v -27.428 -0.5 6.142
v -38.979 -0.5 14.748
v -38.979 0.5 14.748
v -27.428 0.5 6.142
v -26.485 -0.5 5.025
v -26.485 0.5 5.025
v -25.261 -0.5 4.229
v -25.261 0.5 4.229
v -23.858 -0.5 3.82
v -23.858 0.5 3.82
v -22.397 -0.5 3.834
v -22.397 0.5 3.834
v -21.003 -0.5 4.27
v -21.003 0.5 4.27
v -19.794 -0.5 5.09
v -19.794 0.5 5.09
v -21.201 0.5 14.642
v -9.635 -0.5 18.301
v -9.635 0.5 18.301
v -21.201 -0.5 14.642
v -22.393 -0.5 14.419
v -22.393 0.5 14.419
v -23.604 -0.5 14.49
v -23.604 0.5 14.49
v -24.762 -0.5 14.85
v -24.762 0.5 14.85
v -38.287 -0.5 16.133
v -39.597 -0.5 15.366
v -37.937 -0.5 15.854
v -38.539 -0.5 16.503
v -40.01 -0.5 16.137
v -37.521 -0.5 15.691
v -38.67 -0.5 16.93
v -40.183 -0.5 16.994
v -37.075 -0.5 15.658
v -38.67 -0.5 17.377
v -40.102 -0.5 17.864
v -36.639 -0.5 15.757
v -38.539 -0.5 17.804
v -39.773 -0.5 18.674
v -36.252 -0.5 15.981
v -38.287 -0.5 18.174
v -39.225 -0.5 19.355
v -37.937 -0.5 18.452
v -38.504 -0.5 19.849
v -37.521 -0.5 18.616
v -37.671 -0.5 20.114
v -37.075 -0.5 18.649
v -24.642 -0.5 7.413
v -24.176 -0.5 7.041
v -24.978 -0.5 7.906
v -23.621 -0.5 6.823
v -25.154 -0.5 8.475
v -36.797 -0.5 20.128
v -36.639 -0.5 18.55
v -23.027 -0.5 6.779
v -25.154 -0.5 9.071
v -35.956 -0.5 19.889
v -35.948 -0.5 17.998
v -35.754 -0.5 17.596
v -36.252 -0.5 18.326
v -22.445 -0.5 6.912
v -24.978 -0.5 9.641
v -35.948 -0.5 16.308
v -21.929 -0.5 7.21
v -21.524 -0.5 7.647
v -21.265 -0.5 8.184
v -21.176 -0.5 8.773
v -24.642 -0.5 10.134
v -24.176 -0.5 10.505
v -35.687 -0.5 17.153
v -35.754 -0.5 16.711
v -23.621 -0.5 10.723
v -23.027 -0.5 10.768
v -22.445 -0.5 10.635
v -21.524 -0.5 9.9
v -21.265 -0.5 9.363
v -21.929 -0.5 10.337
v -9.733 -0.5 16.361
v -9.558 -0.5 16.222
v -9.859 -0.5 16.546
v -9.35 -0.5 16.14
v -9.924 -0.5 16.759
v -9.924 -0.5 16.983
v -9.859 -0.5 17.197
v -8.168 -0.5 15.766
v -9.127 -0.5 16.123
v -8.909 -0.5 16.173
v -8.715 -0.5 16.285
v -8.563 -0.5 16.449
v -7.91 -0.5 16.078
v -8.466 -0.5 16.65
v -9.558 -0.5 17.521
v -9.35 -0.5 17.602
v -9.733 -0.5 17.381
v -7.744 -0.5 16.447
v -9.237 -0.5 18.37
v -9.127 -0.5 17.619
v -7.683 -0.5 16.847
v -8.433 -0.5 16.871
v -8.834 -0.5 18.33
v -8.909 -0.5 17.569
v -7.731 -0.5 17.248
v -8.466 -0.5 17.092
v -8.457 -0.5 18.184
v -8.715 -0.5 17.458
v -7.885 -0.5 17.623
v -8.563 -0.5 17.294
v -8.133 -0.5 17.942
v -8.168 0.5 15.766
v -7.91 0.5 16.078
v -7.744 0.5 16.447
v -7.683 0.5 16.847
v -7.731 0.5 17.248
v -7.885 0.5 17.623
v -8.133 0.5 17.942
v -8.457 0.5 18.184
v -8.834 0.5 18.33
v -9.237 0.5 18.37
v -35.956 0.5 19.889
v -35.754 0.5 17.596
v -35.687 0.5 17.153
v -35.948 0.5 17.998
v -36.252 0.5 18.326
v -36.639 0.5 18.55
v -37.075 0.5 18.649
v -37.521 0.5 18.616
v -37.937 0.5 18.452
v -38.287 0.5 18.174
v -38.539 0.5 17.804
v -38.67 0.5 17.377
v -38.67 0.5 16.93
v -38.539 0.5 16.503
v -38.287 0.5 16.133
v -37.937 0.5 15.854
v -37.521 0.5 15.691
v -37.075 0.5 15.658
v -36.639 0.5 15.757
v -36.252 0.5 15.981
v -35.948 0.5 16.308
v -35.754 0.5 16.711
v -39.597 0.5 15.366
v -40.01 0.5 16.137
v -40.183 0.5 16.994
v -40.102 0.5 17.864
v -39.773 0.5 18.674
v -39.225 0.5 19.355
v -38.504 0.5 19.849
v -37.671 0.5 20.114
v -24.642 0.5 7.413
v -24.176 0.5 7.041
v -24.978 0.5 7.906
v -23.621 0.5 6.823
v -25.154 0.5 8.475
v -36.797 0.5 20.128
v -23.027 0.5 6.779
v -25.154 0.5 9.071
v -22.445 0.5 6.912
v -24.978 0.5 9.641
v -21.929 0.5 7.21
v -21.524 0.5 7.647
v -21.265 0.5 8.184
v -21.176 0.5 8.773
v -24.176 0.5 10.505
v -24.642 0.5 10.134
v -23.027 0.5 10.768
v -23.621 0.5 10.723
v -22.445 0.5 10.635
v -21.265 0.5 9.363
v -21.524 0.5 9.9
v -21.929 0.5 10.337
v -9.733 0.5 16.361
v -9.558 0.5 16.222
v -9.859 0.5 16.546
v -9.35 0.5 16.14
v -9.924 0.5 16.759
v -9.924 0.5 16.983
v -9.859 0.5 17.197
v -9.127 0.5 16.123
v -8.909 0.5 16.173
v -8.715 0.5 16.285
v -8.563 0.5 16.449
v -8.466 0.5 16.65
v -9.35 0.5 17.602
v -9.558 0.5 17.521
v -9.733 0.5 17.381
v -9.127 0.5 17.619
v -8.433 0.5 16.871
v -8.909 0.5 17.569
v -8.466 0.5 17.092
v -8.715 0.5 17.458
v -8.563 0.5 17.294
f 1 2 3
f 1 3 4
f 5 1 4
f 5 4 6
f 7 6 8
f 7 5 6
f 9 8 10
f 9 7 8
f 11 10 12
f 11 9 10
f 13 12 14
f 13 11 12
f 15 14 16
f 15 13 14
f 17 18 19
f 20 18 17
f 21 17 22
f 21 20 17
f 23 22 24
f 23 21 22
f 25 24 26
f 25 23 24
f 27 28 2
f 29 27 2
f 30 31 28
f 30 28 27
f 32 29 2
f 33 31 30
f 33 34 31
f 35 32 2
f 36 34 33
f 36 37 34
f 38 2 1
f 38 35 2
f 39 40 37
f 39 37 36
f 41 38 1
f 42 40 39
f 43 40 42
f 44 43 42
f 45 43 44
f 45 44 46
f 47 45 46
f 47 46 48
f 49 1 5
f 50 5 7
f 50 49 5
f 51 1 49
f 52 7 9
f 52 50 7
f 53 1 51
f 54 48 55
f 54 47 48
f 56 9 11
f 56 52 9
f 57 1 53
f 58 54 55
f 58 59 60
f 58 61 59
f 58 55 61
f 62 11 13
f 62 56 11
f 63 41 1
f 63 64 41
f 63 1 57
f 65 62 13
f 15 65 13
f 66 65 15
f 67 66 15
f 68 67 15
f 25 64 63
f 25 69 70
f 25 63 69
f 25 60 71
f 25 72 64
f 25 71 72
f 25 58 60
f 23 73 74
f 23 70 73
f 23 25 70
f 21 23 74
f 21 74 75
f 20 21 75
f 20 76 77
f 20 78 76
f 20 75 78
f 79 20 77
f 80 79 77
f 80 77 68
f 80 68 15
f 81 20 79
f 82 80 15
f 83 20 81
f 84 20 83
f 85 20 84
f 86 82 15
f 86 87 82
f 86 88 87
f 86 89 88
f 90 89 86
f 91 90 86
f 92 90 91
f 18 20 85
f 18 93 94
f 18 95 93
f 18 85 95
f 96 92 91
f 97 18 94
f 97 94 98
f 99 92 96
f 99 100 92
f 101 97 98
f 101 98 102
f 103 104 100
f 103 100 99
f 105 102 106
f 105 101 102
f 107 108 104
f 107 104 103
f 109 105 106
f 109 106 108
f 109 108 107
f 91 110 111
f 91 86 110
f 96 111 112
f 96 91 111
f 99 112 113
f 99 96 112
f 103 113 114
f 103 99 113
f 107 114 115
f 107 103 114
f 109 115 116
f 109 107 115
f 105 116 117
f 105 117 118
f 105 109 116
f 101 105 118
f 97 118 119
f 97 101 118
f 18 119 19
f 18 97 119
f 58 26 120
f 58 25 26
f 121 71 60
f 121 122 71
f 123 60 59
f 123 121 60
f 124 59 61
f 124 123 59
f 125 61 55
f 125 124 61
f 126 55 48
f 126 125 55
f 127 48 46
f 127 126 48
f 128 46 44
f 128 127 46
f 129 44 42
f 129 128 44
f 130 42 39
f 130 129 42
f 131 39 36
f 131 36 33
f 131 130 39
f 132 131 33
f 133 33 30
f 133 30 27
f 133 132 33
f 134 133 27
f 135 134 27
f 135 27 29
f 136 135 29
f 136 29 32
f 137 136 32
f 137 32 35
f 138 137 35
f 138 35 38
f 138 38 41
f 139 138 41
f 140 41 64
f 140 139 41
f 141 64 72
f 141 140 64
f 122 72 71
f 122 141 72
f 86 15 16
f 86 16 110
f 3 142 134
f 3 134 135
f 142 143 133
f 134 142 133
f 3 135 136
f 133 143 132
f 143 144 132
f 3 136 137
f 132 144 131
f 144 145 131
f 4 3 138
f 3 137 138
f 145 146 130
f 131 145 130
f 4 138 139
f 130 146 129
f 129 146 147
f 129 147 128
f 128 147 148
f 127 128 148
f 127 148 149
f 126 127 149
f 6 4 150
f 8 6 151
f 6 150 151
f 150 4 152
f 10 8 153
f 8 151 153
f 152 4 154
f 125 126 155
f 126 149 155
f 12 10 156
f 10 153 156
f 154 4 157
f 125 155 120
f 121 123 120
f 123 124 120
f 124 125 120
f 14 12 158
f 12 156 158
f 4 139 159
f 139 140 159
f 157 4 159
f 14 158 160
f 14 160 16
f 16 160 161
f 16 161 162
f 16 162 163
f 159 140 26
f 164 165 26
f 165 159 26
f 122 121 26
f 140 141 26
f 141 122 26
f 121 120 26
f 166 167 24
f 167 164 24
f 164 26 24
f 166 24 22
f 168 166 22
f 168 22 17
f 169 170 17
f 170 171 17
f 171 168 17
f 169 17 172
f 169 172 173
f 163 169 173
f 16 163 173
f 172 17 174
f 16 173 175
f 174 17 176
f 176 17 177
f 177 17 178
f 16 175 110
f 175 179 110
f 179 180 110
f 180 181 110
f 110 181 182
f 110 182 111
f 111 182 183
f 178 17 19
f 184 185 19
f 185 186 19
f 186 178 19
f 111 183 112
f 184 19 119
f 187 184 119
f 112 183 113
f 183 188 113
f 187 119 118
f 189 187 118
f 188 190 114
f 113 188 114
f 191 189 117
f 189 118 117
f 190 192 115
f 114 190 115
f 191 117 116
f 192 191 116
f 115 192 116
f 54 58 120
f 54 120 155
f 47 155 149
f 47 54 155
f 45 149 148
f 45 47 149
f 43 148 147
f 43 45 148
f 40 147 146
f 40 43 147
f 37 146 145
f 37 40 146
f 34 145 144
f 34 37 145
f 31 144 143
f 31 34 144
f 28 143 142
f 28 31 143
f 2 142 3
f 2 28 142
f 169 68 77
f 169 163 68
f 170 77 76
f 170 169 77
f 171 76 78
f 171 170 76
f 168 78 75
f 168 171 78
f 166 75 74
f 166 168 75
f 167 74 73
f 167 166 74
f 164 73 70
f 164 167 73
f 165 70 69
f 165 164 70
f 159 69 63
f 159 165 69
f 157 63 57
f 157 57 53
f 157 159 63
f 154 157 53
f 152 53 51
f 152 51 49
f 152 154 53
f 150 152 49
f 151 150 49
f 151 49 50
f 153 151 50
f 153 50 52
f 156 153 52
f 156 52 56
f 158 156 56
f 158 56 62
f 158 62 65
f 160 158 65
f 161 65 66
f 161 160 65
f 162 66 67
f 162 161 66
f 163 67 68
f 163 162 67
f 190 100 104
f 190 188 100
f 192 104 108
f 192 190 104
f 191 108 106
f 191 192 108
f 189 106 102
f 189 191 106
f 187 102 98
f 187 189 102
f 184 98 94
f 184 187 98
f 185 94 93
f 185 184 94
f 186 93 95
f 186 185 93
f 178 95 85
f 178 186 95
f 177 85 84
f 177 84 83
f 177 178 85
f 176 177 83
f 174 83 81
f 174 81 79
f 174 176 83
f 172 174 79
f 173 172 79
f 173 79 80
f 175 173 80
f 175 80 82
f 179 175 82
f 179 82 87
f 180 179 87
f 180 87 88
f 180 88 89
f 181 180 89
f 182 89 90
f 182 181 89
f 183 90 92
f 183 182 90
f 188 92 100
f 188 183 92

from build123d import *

# Parameters (mm, degrees)
F0_R     = 2
F0_R_2   = 1.5
F0_R_3   = 0.75
F1_DEPTH = 0.5


with BuildPart() as f1:
    # F0 (on Front) → F1 (new body, symmetric)
    with BuildSketch(Plane.XZ):
        with BuildLine():
            Line((-24.761863, 14.850086), (-35.955657, 19.889062))
            ThreePointArc((-35.955657, 19.889062), (-39.773049, 18.674288), (-38.979378, 14.74768))
            Line((-38.979378, 14.74768), (-27.427554, 6.141753))
            ThreePointArc((-27.427554, 6.141753), (-23.858251, 3.820055), (-19.794239, 5.090492))
            Line((-19.794239, 5.090492), (-8.168313, 15.766349))
            ThreePointArc((-8.168313, 15.766349), (-7.88459, 17.622506), (-9.635309, 18.301331))
            Line((-9.635309, 18.301331), (-21.201303, 14.642294))
            ThreePointArc((-21.201303, 14.642294), (-23.000741, 14.417917), (-24.761863, 14.850086))
        make_face()
        with Locations((-23.17609, 8.773302)):
            Circle(F0_R, mode=Mode.SUBTRACT)
        with Locations((-37.18711, 17.153459)):
            Circle(F0_R_2, mode=Mode.SUBTRACT)
        with Locations((-9.182868, 16.871192)):
            Circle(F0_R_3, mode=Mode.SUBTRACT)
    extrude(amount=F1_DEPTH, both=True)


solid = f1.part
